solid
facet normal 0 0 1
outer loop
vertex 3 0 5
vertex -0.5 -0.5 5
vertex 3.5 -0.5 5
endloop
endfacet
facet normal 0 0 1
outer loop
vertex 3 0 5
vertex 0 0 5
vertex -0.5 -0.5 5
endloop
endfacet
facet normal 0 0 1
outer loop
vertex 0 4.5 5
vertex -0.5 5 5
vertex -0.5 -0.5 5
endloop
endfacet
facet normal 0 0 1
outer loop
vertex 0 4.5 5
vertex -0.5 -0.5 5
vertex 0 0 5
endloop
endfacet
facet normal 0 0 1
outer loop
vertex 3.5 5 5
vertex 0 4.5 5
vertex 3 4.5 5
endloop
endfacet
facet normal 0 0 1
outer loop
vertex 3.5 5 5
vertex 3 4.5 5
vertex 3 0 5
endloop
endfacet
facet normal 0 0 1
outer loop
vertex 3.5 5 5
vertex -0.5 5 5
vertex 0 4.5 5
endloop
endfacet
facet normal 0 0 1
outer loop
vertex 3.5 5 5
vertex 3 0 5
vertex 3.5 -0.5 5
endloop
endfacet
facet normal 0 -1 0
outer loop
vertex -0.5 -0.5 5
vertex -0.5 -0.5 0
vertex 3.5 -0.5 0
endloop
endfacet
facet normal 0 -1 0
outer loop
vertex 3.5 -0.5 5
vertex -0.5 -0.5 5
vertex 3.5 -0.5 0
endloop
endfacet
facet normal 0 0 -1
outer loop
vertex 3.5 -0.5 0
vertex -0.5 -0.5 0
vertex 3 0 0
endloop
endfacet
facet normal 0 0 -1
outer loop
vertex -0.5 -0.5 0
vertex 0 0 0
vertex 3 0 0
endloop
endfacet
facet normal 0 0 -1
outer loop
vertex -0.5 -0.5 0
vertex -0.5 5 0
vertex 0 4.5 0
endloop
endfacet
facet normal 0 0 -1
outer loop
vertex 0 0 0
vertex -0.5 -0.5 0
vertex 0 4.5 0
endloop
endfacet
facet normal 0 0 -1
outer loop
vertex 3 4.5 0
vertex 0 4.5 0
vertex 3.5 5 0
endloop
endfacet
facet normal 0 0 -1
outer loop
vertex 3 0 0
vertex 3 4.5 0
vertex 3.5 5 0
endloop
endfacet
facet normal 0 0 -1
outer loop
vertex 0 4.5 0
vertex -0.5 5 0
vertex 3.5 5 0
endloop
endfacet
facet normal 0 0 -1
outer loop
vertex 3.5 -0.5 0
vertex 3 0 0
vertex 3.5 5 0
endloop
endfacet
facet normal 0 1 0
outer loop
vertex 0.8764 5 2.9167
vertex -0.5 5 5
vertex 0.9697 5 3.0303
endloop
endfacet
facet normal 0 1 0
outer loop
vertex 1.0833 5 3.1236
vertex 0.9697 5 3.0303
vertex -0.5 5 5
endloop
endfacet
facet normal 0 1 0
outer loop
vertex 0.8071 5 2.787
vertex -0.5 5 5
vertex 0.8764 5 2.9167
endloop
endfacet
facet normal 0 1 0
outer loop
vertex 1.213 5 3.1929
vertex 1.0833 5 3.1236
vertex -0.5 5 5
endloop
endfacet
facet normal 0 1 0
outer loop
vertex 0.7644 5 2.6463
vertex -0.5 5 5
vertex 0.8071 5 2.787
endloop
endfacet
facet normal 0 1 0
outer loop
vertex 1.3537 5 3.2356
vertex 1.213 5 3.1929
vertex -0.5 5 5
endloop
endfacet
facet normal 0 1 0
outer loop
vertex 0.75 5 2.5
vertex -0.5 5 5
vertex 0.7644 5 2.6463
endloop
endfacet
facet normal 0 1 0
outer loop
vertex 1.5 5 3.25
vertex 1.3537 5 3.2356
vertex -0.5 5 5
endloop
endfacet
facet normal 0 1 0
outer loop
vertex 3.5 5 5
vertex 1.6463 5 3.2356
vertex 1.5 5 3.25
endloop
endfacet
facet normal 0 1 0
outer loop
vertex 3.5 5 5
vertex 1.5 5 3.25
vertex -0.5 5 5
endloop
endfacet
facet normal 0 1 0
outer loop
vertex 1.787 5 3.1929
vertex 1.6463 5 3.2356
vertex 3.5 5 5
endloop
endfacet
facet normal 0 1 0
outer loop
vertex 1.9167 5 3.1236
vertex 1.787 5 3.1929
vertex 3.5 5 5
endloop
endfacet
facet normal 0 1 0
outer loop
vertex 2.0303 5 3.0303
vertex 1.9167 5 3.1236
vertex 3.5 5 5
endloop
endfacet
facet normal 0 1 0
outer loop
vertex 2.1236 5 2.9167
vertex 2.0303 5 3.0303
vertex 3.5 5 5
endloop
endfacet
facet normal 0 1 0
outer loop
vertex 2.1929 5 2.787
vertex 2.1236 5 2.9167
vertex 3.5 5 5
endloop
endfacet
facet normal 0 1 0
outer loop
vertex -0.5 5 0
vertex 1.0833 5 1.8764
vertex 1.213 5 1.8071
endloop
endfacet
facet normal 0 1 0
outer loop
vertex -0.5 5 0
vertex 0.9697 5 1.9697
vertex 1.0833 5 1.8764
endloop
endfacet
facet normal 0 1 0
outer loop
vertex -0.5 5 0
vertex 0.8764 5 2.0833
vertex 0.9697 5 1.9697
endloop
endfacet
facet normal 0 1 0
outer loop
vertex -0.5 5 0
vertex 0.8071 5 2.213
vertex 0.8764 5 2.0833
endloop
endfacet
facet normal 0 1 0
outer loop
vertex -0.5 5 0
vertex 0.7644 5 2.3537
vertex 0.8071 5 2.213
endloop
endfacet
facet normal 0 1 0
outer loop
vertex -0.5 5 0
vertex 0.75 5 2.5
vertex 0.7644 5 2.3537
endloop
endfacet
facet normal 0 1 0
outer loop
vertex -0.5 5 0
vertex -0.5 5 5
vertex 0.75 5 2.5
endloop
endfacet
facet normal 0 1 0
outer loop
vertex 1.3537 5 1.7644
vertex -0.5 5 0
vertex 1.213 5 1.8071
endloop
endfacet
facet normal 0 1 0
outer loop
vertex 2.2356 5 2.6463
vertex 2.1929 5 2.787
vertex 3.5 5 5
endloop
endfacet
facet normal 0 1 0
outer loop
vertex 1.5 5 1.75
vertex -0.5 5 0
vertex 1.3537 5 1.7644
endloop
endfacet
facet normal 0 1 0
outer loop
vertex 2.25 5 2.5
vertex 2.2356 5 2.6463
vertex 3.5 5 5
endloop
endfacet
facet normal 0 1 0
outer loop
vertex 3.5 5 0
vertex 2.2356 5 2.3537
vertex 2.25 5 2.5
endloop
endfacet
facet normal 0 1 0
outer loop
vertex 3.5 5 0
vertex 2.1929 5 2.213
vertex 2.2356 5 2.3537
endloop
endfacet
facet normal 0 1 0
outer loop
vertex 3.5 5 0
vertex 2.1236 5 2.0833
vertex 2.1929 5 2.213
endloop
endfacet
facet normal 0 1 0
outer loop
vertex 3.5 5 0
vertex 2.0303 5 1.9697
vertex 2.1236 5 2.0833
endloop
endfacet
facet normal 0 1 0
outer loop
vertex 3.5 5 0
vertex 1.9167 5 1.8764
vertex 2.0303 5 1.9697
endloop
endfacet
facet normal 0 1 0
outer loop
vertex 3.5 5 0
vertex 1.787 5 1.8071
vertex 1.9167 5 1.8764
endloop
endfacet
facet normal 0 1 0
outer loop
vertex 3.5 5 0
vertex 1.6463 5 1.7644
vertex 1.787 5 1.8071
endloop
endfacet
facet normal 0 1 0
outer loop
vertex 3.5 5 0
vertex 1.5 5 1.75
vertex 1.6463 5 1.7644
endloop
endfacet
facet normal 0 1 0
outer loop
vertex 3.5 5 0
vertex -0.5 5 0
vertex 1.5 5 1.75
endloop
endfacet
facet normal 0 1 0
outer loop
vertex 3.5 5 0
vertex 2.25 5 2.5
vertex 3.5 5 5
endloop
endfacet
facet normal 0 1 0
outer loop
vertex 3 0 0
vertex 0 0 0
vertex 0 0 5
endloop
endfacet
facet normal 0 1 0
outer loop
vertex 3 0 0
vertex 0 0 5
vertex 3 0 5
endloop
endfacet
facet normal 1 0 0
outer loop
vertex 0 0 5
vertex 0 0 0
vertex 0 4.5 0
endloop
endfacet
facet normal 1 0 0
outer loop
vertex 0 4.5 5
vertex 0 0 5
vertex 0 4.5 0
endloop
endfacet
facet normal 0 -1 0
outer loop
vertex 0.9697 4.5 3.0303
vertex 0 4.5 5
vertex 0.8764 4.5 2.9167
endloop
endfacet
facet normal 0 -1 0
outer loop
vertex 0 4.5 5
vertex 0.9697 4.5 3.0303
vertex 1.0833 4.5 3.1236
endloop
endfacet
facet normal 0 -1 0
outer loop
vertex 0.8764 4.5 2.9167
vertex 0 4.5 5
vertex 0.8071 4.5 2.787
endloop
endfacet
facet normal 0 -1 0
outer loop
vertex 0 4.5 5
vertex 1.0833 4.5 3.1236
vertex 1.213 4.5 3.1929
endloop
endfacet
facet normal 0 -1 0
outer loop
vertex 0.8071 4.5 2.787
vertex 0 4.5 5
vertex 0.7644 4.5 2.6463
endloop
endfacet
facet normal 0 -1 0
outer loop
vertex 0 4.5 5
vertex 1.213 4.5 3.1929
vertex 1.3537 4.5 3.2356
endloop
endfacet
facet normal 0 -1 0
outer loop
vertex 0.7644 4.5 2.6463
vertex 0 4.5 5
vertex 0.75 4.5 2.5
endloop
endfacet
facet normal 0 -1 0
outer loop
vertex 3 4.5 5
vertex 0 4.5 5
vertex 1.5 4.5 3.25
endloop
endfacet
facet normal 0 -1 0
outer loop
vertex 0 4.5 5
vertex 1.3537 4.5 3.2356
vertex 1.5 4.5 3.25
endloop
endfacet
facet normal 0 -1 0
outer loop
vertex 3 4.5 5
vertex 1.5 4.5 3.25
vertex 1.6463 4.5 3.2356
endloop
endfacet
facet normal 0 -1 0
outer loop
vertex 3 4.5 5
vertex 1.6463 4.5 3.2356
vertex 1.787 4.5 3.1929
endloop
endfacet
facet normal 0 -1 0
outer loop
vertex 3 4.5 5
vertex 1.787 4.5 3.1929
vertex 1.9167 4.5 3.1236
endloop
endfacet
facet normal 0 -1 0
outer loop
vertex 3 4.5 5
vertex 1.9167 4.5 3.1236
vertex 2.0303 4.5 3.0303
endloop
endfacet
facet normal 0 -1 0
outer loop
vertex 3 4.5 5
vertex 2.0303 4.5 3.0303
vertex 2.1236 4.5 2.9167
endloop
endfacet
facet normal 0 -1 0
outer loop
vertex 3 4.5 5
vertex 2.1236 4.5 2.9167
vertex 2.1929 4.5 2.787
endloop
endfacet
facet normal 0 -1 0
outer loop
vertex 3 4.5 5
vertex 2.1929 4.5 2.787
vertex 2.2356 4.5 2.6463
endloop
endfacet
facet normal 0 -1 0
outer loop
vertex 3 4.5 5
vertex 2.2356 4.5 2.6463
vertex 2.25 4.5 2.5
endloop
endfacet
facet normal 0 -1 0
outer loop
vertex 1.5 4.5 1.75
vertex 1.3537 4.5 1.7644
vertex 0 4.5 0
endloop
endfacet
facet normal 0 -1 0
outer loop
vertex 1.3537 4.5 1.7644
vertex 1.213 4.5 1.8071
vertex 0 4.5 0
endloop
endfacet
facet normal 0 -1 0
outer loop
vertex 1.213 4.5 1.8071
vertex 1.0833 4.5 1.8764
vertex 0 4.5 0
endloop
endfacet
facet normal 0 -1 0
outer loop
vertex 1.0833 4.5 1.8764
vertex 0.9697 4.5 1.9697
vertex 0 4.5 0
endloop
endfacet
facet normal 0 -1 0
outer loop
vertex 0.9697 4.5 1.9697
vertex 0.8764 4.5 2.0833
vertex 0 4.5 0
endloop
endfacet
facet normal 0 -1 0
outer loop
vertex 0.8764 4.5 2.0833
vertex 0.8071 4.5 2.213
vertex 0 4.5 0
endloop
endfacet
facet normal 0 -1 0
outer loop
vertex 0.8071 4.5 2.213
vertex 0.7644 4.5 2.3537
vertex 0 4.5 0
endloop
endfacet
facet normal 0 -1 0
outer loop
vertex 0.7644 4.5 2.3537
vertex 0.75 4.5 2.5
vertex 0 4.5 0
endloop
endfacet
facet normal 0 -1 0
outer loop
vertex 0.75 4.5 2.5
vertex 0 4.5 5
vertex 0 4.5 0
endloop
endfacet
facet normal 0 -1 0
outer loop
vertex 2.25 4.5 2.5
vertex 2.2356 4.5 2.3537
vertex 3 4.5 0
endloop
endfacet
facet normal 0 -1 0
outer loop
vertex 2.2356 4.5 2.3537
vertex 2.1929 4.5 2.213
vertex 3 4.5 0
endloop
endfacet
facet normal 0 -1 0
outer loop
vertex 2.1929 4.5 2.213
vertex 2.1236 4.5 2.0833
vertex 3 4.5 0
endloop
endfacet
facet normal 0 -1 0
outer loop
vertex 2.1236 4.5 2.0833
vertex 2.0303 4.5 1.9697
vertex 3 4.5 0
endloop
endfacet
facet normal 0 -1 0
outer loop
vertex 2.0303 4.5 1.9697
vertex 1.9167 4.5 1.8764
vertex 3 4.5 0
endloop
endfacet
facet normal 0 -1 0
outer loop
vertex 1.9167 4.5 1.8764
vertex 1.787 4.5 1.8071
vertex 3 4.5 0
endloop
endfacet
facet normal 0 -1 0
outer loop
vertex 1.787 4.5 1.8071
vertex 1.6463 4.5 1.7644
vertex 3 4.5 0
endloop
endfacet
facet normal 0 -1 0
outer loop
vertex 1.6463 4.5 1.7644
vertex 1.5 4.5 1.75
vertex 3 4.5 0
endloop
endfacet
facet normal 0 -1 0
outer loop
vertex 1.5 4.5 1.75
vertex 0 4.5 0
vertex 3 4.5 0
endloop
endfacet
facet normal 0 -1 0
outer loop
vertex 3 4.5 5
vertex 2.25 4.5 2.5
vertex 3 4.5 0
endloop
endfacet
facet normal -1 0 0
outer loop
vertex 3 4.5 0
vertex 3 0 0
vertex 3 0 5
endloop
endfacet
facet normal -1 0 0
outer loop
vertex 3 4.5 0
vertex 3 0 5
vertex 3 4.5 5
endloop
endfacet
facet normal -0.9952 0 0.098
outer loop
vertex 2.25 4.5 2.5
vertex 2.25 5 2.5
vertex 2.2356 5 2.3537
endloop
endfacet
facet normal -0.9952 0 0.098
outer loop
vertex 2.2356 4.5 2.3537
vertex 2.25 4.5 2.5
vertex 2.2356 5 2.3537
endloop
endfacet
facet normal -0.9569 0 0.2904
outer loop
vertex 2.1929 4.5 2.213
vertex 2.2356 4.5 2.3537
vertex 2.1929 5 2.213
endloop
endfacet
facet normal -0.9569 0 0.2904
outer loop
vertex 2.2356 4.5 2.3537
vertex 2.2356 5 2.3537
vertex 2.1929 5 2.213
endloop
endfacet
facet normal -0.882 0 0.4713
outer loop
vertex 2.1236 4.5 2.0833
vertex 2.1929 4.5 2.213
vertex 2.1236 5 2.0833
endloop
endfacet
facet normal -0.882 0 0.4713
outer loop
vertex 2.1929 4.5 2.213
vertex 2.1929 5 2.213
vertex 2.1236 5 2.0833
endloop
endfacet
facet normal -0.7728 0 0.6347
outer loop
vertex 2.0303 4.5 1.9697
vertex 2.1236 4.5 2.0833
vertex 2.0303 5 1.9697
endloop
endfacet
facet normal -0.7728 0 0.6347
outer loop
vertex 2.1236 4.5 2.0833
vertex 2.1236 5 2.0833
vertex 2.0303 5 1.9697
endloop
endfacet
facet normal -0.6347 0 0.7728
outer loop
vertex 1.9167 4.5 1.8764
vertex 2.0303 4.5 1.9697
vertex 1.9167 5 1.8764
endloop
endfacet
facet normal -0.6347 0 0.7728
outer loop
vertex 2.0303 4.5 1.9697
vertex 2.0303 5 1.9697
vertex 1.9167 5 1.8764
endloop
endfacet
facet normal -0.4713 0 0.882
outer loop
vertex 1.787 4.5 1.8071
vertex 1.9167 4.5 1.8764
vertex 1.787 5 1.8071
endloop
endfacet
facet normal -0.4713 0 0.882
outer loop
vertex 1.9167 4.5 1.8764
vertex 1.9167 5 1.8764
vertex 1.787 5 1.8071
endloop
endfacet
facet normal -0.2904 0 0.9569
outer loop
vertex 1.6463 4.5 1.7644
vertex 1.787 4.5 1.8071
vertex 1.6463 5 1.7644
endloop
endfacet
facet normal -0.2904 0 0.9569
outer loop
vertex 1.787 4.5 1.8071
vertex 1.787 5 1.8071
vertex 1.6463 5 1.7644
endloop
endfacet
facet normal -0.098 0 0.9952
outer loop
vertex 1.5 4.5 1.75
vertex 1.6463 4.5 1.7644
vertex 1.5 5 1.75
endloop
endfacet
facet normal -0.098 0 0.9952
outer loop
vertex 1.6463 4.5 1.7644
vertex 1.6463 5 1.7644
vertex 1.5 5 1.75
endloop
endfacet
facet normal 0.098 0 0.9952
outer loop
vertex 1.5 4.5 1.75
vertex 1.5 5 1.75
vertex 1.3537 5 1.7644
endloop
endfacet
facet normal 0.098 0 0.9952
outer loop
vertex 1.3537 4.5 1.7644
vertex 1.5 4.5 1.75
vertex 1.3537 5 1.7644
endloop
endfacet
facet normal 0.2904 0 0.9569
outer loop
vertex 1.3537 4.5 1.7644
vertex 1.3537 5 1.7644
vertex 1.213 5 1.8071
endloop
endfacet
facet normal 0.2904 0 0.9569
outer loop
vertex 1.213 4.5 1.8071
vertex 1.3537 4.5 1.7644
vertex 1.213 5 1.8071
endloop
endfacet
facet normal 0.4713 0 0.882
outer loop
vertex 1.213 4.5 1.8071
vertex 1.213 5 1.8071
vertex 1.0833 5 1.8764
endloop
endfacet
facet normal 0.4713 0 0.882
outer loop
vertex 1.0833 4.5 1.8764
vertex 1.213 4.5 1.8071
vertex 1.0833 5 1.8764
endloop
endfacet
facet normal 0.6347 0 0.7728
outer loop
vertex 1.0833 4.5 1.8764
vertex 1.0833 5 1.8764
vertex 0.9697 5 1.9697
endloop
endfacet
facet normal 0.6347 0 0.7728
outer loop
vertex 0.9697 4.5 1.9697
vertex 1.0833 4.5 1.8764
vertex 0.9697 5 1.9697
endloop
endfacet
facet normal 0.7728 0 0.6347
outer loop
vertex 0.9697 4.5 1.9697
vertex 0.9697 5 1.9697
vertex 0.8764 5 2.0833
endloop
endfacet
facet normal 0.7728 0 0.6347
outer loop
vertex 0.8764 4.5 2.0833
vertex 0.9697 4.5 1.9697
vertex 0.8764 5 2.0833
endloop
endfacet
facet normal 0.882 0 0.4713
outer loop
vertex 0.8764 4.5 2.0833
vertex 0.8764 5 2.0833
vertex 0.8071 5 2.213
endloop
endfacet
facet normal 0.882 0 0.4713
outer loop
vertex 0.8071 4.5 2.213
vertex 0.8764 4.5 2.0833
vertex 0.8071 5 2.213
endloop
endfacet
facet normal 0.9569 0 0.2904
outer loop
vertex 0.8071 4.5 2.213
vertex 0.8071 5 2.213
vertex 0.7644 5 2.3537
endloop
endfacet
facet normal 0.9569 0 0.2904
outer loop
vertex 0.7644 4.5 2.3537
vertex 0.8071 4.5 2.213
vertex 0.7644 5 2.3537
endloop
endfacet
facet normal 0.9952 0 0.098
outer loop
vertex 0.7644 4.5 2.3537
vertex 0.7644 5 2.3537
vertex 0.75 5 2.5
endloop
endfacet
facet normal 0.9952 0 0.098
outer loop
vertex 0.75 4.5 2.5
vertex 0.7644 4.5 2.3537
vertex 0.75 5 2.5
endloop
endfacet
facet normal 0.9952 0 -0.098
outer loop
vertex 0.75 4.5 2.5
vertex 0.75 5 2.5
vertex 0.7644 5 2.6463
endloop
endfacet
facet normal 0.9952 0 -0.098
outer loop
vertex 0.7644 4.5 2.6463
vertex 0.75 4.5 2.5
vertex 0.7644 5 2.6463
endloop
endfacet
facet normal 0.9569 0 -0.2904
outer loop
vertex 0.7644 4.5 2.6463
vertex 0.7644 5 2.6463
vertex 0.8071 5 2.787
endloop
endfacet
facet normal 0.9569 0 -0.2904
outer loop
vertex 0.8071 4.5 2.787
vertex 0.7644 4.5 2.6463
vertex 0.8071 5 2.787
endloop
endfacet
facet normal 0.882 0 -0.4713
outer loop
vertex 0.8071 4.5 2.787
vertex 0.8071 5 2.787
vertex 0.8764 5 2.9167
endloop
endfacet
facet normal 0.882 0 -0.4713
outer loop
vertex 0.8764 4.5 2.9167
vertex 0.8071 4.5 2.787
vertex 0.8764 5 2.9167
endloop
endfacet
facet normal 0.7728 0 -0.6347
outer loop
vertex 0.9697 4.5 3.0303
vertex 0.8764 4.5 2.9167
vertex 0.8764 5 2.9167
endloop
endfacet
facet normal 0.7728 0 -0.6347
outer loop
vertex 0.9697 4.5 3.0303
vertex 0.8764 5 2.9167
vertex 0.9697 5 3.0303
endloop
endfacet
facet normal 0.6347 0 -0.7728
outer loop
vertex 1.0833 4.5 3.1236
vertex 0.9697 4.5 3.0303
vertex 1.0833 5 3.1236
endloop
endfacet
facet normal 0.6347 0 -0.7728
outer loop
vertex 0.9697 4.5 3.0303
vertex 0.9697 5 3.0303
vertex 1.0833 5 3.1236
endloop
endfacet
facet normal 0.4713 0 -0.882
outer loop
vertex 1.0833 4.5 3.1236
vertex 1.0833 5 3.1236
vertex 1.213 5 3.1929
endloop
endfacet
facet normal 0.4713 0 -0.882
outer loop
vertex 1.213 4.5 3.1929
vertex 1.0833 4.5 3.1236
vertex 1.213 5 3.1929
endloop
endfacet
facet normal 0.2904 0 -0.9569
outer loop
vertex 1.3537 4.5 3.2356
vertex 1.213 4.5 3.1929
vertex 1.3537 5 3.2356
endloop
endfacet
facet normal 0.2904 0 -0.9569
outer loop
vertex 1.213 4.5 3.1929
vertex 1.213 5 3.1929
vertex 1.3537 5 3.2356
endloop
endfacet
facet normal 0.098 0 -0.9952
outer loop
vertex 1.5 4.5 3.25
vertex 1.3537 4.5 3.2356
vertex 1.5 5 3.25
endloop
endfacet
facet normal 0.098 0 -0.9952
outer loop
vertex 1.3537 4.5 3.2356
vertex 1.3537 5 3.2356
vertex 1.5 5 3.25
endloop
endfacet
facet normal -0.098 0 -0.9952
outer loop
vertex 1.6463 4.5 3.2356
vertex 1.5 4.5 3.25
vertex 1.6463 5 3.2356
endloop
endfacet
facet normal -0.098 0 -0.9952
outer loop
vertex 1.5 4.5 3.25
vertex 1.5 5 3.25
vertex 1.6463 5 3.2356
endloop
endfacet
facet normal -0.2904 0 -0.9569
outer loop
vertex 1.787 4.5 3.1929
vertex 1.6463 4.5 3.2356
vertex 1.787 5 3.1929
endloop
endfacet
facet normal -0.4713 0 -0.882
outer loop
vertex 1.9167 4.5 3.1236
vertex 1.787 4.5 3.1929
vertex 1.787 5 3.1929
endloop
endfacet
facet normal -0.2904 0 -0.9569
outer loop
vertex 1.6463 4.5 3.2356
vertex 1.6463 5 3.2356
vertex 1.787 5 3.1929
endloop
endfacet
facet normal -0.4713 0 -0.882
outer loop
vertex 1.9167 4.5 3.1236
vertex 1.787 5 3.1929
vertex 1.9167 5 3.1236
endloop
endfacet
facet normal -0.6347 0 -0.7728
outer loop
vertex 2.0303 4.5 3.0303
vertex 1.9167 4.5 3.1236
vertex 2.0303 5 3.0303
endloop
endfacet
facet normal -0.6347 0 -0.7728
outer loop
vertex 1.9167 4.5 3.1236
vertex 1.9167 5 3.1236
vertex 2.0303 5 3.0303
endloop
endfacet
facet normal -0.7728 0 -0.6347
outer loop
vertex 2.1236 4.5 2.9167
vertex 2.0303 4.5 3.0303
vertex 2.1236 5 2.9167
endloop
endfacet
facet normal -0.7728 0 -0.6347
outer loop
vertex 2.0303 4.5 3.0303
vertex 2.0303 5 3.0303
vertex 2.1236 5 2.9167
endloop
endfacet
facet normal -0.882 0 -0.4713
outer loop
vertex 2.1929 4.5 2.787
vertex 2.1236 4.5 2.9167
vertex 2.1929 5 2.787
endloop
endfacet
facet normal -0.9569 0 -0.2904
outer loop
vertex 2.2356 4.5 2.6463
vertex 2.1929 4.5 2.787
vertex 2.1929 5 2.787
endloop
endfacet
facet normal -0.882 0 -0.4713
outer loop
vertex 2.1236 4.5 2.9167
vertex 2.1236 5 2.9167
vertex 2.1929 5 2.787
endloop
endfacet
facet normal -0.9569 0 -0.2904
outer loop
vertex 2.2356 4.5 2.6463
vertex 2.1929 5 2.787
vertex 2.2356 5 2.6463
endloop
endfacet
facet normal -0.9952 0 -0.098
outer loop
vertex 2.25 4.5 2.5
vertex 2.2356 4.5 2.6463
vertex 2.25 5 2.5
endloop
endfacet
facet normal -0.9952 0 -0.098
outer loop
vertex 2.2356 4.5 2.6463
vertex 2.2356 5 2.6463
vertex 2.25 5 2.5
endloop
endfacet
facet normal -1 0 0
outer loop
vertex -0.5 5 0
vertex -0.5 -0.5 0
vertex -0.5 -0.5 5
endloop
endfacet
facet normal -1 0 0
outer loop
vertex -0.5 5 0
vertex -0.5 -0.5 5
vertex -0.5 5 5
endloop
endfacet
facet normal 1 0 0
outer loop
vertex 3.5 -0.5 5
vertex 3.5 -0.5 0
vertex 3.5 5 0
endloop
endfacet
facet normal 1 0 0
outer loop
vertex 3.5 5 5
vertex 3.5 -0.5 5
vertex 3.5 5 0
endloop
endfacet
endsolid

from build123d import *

# Parameters (mm, degrees)
SKETCH1_W           = 4
SKETCH1_H           = 5.5
SKETCH1_W_2         = 3
SKETCH1_H_2         = 4.5
EXTRUDE_THIN1_DEPTH = 5
CUT_EXTRUDE1_REACH  = 7.5
SKETCH2_R           = 0.75


with BuildPart() as part:
    # Sketch1 → Extrude-Thin1 (new body)
    with BuildSketch(Plane.XY):
        with Locations((1.5, 2.25)):
            Rectangle(SKETCH1_W, SKETCH1_H)
        with Locations((1.5, 2.25)):
            Rectangle(SKETCH1_W_2, SKETCH1_H_2, mode=Mode.SUBTRACT)
    extrude(amount=EXTRUDE_THIN1_DEPTH)

    # Sketch2 → Cut-Extrude1 (cut, up to next)
    with BuildSketch(Plane(origin=(0, 5, 0), x_dir=(1, 0, 0), z_dir=(0, 1, 0)), mode=Mode.PRIVATE) as cut_extrude1_sk1:
        with Locations((1.5, -2.5)):
            Circle(SKETCH2_R)
    cut_extrude1_tool1 = extrude(cut_extrude1_sk1.sketch, amount=-CUT_EXTRUDE1_REACH, mode=Mode.PRIVATE) & part.part
    add(cut_extrude1_tool1.solids().sort_by_distance((1.5, 5, 2.5))[0], mode=Mode.SUBTRACT)


solid = part.part
